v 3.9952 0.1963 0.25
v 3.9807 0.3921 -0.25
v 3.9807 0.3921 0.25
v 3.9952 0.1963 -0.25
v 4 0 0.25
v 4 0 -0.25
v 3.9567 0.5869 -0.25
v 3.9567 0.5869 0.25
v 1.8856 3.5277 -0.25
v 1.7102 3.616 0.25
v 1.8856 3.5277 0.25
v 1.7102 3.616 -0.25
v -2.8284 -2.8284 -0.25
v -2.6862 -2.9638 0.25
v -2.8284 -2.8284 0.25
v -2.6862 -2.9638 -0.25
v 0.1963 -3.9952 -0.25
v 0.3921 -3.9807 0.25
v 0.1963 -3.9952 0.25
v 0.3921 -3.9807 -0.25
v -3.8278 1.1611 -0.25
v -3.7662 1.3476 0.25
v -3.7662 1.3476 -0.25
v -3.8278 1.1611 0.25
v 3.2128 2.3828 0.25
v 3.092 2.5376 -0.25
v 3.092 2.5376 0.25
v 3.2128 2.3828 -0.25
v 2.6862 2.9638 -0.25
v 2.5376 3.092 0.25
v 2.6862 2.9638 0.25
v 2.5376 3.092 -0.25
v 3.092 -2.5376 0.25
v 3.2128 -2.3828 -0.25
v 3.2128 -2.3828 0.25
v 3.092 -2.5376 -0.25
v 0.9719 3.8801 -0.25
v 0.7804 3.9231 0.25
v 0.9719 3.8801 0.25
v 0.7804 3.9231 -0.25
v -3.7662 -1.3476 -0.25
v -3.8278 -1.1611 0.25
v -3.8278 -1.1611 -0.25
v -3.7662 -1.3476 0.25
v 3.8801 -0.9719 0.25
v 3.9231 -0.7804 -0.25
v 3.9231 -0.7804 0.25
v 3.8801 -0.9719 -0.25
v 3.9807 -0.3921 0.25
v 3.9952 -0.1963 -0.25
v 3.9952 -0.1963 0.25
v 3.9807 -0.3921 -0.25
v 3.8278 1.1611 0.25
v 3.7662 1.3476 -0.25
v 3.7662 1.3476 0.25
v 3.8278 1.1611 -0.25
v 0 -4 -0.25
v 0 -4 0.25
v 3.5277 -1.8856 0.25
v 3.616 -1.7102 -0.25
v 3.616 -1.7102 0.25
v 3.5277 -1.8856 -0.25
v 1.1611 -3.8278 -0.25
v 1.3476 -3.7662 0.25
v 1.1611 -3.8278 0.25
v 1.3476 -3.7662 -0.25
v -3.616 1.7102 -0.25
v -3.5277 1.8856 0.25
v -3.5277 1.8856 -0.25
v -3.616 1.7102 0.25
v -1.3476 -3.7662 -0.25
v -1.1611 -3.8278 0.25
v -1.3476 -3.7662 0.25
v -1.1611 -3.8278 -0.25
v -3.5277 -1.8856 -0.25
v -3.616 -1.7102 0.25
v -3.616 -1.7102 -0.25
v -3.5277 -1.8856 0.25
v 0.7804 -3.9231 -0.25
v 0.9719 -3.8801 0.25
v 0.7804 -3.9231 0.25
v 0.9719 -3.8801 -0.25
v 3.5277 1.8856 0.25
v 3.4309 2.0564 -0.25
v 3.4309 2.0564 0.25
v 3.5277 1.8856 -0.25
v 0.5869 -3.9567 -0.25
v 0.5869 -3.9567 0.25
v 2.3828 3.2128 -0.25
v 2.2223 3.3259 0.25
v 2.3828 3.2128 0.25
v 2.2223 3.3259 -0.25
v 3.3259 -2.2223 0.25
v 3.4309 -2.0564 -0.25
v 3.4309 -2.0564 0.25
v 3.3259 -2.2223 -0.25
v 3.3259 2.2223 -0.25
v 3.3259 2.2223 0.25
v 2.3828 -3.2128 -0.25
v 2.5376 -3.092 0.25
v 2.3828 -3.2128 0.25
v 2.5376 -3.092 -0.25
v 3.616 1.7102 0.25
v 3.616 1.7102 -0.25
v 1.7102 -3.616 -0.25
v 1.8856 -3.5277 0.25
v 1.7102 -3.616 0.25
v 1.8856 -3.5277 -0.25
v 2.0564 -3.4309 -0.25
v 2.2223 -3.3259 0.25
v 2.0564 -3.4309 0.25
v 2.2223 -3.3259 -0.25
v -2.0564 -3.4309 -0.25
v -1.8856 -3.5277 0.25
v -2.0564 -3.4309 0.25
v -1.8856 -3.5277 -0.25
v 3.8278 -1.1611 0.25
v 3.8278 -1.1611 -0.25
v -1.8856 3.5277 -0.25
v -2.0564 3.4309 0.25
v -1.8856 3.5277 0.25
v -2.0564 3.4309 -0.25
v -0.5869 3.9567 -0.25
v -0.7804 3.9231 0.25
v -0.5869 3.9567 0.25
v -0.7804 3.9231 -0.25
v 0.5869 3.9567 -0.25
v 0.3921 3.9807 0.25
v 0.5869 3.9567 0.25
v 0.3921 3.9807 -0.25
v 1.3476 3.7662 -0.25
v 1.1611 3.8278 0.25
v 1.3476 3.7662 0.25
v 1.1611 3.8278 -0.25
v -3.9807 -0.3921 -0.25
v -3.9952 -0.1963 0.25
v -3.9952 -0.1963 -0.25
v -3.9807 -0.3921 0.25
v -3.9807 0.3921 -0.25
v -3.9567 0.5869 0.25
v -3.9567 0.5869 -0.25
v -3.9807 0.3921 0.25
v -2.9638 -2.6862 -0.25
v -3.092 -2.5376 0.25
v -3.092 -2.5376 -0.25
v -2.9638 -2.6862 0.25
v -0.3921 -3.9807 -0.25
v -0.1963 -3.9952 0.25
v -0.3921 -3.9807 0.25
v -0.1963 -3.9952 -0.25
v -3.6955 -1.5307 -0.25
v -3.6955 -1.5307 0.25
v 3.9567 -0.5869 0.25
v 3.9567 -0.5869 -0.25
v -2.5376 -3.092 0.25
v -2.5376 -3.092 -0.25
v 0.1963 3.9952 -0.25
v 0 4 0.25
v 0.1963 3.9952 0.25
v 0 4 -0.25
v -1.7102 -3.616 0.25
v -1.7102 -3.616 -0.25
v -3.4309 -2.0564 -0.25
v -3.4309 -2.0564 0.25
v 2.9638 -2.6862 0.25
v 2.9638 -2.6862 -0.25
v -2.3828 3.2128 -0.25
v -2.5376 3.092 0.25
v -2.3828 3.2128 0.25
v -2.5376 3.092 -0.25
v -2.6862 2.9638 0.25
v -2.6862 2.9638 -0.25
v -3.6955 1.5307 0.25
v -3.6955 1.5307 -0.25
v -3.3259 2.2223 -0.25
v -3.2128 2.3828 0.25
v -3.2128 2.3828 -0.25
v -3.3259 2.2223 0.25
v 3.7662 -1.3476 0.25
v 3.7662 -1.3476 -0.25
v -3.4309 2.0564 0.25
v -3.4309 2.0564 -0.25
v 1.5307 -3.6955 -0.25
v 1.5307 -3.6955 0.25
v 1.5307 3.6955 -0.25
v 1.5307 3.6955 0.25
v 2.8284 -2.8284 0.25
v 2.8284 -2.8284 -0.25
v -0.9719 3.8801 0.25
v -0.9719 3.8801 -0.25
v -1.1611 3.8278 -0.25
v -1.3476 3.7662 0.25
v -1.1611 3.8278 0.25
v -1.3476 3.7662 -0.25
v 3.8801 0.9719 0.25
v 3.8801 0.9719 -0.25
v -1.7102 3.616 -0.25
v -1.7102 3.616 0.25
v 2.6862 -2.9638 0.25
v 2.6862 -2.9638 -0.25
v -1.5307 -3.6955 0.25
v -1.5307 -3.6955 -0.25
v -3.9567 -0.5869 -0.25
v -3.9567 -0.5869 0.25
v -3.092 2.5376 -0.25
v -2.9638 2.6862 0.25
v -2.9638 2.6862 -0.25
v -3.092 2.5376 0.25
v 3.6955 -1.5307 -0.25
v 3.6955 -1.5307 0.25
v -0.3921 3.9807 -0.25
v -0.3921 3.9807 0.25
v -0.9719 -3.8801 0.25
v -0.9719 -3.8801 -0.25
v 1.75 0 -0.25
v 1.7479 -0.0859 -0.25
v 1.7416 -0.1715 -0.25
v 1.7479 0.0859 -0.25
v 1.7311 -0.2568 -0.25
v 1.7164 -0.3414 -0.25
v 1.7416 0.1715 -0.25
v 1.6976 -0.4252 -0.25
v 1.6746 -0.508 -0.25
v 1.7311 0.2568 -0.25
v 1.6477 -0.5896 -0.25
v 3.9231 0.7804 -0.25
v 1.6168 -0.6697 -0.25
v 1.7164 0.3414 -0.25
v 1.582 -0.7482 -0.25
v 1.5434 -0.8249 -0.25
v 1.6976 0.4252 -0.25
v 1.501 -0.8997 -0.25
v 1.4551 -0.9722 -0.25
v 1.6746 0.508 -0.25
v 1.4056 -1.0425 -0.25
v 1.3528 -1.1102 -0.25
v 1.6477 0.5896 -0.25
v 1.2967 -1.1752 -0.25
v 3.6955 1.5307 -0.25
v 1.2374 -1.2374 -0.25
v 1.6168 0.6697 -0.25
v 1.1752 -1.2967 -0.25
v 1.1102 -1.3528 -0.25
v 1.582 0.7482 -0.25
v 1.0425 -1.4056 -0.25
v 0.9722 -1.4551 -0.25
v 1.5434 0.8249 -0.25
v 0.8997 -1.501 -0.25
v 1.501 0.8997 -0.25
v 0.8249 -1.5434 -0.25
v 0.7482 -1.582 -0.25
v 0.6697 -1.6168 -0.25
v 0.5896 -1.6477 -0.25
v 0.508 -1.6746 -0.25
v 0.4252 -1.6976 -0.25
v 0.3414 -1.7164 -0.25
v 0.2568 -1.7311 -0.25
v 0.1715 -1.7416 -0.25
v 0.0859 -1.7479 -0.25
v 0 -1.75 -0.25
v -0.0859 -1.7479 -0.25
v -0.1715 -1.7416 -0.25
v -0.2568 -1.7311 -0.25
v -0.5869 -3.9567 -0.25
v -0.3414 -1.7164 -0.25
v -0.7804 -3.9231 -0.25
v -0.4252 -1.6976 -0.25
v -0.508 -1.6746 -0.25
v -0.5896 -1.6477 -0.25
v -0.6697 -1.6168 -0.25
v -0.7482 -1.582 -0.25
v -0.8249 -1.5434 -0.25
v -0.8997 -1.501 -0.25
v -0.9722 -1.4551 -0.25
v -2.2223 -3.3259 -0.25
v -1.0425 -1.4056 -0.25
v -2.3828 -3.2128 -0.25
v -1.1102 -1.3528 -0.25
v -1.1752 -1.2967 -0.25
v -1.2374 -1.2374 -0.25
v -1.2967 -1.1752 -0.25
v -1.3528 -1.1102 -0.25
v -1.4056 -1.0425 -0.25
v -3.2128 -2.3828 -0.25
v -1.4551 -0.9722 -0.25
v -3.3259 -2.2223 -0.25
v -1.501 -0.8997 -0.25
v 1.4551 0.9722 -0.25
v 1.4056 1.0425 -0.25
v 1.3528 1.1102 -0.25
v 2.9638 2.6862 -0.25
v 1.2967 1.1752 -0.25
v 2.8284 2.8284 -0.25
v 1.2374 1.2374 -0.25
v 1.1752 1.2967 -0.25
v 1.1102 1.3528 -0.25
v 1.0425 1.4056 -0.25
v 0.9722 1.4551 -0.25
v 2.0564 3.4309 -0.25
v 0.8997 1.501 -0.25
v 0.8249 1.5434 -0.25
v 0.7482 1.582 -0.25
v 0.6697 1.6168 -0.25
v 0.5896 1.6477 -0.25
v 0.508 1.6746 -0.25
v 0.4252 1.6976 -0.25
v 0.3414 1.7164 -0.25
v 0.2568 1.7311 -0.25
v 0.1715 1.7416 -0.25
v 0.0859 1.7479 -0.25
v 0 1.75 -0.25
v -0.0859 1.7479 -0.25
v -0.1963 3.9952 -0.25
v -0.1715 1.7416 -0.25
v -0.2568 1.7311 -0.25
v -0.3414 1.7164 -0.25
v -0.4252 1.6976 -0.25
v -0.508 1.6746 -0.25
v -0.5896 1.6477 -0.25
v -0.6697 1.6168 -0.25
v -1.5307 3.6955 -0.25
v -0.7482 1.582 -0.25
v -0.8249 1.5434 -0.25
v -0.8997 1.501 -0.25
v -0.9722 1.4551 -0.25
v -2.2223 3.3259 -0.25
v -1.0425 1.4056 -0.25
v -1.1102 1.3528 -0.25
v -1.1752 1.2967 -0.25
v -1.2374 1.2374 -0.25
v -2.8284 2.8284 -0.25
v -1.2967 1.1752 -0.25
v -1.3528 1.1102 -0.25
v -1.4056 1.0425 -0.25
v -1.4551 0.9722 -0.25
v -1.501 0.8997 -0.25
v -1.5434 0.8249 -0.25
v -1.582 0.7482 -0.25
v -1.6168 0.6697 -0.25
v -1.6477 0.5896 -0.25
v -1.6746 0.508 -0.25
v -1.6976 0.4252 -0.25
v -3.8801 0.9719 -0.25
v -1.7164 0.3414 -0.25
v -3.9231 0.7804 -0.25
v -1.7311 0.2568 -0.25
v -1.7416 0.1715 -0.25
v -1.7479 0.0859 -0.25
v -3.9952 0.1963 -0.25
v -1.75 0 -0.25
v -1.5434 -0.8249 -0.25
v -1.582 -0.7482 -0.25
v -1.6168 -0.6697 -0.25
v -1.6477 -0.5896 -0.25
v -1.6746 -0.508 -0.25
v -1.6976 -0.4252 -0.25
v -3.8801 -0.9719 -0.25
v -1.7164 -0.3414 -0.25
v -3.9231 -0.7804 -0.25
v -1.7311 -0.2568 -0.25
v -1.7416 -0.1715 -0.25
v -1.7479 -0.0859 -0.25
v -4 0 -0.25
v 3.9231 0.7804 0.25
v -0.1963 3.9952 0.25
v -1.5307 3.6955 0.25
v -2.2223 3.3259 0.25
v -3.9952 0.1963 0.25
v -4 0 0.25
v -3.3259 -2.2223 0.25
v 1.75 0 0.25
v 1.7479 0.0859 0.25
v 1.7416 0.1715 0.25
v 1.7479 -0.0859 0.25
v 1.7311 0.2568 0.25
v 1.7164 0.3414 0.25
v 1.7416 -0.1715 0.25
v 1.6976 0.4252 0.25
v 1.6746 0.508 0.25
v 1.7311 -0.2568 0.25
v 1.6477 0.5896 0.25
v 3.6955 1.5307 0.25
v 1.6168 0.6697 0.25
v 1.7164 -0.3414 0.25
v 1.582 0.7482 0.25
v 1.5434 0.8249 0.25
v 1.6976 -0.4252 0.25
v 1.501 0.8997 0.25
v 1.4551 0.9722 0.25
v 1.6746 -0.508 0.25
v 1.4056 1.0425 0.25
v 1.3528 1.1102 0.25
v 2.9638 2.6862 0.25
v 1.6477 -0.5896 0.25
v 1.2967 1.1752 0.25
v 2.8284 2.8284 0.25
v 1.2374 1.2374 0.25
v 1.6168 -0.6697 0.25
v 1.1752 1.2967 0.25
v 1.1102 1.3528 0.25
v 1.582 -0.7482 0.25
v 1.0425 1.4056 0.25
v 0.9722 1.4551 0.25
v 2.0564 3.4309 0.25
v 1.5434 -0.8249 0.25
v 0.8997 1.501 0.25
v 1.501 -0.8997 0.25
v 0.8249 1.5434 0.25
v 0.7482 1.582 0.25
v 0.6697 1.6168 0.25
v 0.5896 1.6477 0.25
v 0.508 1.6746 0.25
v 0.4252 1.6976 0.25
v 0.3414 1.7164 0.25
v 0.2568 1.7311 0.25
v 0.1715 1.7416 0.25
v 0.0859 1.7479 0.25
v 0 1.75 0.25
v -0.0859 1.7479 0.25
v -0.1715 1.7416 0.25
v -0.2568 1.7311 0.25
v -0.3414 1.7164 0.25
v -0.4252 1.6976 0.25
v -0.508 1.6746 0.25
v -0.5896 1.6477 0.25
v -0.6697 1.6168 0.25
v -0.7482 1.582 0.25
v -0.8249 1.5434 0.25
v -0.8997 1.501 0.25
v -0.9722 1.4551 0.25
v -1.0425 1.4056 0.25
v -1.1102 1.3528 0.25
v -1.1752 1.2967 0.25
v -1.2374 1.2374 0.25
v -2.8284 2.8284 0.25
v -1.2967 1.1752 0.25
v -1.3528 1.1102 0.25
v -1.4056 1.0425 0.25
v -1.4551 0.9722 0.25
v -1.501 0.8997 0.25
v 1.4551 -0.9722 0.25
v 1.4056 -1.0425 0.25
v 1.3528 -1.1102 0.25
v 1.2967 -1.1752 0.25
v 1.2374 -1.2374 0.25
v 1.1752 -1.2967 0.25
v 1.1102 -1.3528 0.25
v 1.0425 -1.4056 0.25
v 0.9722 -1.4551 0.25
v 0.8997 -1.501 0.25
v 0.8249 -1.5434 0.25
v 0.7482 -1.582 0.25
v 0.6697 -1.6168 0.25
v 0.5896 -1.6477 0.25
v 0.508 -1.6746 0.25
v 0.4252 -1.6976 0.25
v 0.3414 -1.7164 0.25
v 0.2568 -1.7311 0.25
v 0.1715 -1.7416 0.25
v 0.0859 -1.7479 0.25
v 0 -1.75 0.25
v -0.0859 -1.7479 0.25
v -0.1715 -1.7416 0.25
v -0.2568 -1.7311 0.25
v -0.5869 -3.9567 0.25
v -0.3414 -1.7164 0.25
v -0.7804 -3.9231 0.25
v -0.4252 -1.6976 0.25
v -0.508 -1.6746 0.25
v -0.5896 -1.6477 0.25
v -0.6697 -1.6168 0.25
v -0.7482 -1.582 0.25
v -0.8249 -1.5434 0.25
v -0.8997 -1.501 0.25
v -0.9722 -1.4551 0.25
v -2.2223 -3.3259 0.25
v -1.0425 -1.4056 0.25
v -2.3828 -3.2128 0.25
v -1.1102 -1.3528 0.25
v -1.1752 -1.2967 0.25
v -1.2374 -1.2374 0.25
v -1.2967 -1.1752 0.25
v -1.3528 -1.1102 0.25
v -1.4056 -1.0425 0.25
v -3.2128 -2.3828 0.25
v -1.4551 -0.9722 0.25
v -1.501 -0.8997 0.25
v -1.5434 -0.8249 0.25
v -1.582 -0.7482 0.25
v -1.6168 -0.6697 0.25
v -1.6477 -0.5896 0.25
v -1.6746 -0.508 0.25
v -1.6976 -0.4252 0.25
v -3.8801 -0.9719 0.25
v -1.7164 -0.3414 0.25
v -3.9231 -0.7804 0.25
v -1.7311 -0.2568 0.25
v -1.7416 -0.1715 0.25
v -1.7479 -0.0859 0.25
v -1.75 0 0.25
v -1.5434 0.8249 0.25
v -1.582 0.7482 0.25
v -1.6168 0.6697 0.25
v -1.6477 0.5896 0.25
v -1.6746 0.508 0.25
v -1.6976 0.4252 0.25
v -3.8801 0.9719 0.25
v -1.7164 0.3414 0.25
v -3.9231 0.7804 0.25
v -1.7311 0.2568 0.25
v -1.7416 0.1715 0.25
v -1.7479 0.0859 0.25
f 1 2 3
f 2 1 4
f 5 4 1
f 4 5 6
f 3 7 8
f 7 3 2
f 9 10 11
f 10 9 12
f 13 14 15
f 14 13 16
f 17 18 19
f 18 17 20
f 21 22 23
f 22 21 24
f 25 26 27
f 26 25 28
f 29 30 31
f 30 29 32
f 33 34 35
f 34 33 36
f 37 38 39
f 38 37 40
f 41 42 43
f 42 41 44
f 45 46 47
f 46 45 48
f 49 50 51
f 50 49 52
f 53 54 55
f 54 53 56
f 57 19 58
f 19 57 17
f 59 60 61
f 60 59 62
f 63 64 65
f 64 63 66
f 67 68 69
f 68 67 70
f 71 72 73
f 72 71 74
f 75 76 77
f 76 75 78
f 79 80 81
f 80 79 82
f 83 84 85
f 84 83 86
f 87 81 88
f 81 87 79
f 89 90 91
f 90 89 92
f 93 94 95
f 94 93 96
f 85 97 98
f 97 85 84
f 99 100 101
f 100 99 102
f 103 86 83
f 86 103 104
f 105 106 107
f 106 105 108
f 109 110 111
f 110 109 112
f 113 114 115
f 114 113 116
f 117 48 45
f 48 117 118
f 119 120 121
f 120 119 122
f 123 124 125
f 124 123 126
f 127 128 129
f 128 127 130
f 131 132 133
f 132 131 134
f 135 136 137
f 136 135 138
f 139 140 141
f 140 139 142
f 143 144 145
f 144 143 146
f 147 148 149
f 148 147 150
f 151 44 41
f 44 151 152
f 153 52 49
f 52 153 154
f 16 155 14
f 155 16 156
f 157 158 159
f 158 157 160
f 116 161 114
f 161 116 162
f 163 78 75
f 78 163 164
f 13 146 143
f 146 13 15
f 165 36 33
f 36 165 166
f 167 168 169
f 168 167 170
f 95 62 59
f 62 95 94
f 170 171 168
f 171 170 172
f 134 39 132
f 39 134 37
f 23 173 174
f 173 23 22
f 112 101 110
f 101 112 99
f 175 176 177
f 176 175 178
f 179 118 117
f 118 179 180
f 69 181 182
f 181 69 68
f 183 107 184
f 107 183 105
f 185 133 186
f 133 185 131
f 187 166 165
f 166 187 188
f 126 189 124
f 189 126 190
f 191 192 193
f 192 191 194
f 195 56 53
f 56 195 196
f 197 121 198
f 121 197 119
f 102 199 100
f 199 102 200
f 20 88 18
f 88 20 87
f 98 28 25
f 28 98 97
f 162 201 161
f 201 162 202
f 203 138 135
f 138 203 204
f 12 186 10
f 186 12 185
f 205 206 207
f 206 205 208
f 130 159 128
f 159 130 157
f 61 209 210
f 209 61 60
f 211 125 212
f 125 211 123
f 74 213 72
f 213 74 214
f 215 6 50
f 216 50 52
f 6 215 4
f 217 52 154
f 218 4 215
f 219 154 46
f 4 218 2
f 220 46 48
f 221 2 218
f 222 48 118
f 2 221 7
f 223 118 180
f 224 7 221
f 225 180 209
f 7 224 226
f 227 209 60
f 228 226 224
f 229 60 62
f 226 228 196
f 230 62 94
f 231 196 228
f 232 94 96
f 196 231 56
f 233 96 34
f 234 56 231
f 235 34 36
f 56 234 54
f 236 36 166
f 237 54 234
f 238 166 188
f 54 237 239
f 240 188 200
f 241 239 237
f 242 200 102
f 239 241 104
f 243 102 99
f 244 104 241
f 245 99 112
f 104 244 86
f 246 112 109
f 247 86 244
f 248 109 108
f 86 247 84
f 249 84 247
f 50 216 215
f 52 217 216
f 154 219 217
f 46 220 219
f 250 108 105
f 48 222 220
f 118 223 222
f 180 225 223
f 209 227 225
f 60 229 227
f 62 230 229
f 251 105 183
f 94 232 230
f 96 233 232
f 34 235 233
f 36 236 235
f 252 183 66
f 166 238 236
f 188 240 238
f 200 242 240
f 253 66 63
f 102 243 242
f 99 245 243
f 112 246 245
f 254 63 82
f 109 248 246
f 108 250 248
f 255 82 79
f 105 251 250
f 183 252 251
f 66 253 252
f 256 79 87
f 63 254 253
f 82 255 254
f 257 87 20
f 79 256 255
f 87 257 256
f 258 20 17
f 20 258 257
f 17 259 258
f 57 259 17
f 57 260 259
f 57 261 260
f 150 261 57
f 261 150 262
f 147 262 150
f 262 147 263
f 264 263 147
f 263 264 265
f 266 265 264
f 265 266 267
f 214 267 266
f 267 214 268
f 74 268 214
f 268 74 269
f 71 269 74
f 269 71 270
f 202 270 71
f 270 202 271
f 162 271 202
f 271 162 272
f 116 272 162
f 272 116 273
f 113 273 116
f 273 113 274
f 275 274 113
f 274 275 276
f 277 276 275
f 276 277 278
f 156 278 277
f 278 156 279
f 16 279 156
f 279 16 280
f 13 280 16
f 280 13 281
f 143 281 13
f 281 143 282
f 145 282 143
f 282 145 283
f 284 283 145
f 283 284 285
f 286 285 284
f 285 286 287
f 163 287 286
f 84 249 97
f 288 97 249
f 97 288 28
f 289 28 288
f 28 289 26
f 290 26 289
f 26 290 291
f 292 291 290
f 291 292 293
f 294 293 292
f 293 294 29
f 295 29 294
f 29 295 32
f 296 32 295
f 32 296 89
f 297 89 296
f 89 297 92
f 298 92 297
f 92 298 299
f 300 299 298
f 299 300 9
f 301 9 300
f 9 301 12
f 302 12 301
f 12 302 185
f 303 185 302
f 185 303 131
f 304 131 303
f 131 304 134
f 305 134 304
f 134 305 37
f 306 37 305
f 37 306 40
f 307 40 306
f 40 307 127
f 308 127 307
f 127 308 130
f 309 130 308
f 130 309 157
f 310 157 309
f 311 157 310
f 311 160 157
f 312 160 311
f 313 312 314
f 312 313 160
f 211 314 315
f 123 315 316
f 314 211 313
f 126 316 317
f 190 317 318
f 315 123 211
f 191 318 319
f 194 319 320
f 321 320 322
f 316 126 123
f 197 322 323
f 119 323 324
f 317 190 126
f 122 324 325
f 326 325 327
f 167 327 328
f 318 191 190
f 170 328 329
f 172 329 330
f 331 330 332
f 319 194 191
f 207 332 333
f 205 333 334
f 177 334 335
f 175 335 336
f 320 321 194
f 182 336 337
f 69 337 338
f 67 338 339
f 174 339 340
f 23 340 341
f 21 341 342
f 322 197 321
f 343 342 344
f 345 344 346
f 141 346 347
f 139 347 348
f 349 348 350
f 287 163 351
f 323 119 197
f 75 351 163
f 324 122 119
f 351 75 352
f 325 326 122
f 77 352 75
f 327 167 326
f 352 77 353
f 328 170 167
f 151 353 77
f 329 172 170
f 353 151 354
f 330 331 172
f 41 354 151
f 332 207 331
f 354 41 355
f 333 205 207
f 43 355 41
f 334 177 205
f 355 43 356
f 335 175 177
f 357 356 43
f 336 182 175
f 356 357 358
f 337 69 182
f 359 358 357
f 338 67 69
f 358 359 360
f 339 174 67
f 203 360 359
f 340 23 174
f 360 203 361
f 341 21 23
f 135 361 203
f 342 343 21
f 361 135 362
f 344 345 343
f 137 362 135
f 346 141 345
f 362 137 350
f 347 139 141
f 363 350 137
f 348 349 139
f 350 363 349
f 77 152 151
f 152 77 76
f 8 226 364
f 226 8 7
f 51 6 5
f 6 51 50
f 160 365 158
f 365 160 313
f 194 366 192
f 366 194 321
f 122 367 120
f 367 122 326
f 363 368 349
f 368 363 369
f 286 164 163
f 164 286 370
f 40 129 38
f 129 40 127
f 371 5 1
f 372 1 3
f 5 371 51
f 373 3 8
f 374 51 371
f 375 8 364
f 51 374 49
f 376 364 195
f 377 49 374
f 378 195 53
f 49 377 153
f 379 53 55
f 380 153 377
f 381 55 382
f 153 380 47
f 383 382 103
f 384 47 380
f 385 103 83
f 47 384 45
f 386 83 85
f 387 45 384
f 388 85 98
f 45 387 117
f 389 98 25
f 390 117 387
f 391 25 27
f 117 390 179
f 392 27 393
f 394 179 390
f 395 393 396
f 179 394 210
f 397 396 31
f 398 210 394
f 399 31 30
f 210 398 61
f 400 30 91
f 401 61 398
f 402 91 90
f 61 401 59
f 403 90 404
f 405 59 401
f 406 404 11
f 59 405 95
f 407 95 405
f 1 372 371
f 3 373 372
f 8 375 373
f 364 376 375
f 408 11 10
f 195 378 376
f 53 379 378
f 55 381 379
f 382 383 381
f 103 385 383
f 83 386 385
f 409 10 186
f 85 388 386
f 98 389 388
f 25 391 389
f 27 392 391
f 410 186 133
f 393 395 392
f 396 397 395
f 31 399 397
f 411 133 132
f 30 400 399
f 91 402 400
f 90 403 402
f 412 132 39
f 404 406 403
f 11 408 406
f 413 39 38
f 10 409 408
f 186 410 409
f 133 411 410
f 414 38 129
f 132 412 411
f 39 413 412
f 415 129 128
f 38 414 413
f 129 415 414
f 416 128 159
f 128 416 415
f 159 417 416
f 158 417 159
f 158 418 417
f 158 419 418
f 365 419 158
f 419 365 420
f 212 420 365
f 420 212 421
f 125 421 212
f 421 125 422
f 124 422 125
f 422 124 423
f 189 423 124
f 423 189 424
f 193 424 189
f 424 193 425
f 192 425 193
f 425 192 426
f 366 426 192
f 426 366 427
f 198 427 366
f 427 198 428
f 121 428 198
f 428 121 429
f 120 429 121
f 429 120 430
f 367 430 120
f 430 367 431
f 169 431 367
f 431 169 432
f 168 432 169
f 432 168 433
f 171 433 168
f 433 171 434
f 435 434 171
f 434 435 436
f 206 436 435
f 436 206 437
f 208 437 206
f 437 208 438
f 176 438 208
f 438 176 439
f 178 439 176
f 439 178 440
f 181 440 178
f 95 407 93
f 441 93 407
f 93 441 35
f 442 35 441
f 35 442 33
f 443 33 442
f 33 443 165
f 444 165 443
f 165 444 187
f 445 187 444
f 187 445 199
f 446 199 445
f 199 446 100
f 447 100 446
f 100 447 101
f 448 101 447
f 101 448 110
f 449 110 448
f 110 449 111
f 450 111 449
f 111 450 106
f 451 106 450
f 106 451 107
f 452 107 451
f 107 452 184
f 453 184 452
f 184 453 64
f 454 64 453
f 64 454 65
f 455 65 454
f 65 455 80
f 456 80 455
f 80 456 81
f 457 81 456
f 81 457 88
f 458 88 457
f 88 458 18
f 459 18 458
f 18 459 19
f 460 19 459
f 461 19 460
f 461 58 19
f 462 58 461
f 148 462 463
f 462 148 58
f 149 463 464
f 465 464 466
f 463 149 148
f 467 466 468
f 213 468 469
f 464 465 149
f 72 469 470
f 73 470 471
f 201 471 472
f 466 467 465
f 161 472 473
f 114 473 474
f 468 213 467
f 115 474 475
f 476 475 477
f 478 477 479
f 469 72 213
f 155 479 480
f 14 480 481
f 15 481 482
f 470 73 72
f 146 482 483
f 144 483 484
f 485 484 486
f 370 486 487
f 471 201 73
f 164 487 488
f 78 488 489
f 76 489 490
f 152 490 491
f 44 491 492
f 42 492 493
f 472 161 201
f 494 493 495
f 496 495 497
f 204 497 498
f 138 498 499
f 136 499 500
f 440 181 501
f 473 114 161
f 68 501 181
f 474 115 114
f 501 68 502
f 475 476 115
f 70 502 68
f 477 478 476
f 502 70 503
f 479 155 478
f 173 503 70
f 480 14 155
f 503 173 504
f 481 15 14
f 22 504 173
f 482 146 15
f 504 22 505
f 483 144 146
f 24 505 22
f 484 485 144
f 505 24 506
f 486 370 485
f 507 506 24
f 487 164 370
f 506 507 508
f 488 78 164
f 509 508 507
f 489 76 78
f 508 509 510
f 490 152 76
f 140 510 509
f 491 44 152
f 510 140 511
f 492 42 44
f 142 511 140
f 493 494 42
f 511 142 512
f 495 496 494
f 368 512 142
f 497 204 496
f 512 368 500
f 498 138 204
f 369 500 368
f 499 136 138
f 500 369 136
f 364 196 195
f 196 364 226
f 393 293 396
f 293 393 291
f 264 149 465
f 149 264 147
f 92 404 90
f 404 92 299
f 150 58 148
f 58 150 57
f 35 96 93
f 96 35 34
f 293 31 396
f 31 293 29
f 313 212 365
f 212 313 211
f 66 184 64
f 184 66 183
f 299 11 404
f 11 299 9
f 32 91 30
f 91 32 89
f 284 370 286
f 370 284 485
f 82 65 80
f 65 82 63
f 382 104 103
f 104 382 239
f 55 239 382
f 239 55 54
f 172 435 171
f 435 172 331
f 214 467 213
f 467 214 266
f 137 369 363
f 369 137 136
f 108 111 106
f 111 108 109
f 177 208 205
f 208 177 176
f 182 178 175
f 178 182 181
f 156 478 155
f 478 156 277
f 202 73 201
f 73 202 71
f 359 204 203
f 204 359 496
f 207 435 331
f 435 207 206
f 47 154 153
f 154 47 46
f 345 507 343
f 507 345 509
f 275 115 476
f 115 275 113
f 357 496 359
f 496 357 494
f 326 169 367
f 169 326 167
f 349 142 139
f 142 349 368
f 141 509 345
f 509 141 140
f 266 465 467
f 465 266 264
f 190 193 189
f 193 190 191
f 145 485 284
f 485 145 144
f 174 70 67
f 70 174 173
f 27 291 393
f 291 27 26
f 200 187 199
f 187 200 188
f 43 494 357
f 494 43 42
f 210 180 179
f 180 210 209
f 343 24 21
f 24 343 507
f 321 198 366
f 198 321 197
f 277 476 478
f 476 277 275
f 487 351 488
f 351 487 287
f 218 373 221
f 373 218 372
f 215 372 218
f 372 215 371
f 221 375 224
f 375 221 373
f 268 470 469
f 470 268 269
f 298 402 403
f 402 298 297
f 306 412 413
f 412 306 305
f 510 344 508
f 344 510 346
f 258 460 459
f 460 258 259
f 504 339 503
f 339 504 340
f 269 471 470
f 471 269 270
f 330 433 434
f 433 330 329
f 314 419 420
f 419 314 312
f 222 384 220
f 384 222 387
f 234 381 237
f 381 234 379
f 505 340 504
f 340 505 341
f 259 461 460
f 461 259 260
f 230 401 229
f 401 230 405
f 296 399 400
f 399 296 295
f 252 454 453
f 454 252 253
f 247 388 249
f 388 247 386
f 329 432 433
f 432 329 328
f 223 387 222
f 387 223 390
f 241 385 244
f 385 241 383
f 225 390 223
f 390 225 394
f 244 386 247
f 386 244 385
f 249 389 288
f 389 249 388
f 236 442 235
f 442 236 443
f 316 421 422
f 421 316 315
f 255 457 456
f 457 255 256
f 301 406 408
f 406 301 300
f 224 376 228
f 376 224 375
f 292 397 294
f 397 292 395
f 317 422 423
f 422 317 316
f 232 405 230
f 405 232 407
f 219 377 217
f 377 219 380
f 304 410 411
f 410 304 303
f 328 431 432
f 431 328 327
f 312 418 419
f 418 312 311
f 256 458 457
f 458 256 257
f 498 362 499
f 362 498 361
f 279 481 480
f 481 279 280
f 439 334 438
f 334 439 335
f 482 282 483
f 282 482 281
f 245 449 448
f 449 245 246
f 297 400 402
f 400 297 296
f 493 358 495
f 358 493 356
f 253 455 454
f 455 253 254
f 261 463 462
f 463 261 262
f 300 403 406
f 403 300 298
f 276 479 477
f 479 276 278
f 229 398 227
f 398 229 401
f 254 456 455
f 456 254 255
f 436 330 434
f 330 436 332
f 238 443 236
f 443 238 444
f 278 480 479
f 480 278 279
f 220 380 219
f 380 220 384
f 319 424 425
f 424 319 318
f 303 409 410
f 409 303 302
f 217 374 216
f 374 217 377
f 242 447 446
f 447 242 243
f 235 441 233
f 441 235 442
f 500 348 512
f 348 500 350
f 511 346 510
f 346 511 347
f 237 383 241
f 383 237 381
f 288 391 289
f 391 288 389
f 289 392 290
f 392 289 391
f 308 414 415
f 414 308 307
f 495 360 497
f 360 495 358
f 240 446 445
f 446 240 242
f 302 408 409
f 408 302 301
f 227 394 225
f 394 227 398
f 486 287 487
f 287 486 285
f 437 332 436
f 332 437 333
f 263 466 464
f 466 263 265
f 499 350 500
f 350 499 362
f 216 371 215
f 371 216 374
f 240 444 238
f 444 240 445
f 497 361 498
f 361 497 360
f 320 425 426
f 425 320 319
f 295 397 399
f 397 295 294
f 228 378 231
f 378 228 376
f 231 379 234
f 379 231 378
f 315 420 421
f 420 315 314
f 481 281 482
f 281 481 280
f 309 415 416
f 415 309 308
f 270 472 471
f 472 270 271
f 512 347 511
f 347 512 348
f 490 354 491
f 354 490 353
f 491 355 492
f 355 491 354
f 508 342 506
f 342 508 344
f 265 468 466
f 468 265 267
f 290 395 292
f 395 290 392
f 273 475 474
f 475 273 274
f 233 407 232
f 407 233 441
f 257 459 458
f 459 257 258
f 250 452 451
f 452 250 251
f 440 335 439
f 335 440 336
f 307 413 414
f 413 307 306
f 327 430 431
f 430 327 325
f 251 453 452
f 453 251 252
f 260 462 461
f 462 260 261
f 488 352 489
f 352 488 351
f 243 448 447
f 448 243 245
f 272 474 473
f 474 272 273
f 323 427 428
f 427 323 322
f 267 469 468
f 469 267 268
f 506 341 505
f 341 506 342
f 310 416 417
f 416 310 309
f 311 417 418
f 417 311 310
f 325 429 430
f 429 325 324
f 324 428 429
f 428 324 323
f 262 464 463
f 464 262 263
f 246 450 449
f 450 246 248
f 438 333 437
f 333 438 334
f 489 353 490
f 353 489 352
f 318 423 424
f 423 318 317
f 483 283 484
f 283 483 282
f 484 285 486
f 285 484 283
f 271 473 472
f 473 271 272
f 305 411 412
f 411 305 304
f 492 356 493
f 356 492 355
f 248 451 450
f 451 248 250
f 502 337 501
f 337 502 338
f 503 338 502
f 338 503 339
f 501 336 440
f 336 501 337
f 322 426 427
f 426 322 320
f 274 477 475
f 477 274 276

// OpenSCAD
// Flat washer: 3.5mm ID, 8.0mm OD, 0.5mm thickness

inner_diameter_mm = 3.5;
outer_diameter_mm = 8.0;
thickness_mm      = 0.5;

eps_mm = 0.02;
$fn = 128;

difference() {
    cylinder(d = outer_diameter_mm, h = thickness_mm, center = true);
    cylinder(d = inner_diameter_mm, h = thickness_mm + 2*eps_mm, center = true);
}
